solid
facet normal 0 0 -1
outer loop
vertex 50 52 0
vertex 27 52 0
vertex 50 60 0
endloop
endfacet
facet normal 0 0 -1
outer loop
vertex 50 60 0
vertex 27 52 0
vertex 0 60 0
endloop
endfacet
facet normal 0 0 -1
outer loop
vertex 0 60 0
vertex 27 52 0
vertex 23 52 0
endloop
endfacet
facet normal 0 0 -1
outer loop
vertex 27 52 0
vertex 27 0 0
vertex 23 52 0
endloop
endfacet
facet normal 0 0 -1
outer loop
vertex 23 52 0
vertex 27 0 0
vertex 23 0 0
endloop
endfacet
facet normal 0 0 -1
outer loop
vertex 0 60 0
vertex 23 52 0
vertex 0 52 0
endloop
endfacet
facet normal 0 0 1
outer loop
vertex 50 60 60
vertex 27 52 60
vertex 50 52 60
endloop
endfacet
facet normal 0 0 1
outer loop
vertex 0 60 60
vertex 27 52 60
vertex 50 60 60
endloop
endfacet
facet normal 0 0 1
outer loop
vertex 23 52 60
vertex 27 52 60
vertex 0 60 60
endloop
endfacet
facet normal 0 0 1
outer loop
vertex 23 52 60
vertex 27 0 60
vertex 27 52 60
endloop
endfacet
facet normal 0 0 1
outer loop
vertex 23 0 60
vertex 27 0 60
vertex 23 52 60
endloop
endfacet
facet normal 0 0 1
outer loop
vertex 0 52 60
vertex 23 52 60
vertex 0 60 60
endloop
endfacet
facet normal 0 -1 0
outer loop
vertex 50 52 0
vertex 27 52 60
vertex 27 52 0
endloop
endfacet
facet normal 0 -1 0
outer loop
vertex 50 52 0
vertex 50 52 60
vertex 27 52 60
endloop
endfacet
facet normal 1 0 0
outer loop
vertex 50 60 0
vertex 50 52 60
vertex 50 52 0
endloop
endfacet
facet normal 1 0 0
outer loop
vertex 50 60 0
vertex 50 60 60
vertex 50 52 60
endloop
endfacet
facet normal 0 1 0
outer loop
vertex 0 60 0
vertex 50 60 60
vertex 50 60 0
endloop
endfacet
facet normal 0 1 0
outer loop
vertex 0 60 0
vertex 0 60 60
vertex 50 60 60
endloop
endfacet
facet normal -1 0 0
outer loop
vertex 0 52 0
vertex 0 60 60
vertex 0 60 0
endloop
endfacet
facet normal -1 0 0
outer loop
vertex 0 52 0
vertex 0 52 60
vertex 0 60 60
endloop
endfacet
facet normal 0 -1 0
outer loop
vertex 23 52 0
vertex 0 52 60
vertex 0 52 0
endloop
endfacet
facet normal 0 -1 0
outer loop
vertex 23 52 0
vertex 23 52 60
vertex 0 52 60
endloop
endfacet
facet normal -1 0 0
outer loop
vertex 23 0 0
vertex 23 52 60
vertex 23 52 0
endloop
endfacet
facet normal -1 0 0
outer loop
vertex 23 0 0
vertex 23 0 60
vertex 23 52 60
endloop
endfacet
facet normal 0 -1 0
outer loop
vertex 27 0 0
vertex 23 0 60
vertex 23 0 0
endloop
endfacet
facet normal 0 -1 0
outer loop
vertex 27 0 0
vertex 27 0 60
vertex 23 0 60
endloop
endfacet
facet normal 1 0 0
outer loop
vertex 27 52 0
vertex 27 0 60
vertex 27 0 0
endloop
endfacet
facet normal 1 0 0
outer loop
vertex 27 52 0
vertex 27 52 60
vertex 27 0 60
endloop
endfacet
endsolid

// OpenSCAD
$fn = 32;

// ----------------------------------------------------------------------
// Structural section: tee 50 x 60 mm
// ----------------------------------------------------------------------

// --- parameters (mm) ---
sec_w = 50;               // tee width, X
sec_h = 60;               // tee height, Y
flange_t = 8;             // top flange thickness
web_t = 4;                // web thickness
plate_t = 60;             // cut length, Z (extrusion height)

profile = [[23, 0], [27, 0], [27, 52], [50, 52], [50, 60], [0, 60], [0, 52], [23, 52]];  // primary outline, 8 points, counter clockwise

// --- the one profile operation ---
linear_extrude(height = plate_t) polygon(points = profile);
